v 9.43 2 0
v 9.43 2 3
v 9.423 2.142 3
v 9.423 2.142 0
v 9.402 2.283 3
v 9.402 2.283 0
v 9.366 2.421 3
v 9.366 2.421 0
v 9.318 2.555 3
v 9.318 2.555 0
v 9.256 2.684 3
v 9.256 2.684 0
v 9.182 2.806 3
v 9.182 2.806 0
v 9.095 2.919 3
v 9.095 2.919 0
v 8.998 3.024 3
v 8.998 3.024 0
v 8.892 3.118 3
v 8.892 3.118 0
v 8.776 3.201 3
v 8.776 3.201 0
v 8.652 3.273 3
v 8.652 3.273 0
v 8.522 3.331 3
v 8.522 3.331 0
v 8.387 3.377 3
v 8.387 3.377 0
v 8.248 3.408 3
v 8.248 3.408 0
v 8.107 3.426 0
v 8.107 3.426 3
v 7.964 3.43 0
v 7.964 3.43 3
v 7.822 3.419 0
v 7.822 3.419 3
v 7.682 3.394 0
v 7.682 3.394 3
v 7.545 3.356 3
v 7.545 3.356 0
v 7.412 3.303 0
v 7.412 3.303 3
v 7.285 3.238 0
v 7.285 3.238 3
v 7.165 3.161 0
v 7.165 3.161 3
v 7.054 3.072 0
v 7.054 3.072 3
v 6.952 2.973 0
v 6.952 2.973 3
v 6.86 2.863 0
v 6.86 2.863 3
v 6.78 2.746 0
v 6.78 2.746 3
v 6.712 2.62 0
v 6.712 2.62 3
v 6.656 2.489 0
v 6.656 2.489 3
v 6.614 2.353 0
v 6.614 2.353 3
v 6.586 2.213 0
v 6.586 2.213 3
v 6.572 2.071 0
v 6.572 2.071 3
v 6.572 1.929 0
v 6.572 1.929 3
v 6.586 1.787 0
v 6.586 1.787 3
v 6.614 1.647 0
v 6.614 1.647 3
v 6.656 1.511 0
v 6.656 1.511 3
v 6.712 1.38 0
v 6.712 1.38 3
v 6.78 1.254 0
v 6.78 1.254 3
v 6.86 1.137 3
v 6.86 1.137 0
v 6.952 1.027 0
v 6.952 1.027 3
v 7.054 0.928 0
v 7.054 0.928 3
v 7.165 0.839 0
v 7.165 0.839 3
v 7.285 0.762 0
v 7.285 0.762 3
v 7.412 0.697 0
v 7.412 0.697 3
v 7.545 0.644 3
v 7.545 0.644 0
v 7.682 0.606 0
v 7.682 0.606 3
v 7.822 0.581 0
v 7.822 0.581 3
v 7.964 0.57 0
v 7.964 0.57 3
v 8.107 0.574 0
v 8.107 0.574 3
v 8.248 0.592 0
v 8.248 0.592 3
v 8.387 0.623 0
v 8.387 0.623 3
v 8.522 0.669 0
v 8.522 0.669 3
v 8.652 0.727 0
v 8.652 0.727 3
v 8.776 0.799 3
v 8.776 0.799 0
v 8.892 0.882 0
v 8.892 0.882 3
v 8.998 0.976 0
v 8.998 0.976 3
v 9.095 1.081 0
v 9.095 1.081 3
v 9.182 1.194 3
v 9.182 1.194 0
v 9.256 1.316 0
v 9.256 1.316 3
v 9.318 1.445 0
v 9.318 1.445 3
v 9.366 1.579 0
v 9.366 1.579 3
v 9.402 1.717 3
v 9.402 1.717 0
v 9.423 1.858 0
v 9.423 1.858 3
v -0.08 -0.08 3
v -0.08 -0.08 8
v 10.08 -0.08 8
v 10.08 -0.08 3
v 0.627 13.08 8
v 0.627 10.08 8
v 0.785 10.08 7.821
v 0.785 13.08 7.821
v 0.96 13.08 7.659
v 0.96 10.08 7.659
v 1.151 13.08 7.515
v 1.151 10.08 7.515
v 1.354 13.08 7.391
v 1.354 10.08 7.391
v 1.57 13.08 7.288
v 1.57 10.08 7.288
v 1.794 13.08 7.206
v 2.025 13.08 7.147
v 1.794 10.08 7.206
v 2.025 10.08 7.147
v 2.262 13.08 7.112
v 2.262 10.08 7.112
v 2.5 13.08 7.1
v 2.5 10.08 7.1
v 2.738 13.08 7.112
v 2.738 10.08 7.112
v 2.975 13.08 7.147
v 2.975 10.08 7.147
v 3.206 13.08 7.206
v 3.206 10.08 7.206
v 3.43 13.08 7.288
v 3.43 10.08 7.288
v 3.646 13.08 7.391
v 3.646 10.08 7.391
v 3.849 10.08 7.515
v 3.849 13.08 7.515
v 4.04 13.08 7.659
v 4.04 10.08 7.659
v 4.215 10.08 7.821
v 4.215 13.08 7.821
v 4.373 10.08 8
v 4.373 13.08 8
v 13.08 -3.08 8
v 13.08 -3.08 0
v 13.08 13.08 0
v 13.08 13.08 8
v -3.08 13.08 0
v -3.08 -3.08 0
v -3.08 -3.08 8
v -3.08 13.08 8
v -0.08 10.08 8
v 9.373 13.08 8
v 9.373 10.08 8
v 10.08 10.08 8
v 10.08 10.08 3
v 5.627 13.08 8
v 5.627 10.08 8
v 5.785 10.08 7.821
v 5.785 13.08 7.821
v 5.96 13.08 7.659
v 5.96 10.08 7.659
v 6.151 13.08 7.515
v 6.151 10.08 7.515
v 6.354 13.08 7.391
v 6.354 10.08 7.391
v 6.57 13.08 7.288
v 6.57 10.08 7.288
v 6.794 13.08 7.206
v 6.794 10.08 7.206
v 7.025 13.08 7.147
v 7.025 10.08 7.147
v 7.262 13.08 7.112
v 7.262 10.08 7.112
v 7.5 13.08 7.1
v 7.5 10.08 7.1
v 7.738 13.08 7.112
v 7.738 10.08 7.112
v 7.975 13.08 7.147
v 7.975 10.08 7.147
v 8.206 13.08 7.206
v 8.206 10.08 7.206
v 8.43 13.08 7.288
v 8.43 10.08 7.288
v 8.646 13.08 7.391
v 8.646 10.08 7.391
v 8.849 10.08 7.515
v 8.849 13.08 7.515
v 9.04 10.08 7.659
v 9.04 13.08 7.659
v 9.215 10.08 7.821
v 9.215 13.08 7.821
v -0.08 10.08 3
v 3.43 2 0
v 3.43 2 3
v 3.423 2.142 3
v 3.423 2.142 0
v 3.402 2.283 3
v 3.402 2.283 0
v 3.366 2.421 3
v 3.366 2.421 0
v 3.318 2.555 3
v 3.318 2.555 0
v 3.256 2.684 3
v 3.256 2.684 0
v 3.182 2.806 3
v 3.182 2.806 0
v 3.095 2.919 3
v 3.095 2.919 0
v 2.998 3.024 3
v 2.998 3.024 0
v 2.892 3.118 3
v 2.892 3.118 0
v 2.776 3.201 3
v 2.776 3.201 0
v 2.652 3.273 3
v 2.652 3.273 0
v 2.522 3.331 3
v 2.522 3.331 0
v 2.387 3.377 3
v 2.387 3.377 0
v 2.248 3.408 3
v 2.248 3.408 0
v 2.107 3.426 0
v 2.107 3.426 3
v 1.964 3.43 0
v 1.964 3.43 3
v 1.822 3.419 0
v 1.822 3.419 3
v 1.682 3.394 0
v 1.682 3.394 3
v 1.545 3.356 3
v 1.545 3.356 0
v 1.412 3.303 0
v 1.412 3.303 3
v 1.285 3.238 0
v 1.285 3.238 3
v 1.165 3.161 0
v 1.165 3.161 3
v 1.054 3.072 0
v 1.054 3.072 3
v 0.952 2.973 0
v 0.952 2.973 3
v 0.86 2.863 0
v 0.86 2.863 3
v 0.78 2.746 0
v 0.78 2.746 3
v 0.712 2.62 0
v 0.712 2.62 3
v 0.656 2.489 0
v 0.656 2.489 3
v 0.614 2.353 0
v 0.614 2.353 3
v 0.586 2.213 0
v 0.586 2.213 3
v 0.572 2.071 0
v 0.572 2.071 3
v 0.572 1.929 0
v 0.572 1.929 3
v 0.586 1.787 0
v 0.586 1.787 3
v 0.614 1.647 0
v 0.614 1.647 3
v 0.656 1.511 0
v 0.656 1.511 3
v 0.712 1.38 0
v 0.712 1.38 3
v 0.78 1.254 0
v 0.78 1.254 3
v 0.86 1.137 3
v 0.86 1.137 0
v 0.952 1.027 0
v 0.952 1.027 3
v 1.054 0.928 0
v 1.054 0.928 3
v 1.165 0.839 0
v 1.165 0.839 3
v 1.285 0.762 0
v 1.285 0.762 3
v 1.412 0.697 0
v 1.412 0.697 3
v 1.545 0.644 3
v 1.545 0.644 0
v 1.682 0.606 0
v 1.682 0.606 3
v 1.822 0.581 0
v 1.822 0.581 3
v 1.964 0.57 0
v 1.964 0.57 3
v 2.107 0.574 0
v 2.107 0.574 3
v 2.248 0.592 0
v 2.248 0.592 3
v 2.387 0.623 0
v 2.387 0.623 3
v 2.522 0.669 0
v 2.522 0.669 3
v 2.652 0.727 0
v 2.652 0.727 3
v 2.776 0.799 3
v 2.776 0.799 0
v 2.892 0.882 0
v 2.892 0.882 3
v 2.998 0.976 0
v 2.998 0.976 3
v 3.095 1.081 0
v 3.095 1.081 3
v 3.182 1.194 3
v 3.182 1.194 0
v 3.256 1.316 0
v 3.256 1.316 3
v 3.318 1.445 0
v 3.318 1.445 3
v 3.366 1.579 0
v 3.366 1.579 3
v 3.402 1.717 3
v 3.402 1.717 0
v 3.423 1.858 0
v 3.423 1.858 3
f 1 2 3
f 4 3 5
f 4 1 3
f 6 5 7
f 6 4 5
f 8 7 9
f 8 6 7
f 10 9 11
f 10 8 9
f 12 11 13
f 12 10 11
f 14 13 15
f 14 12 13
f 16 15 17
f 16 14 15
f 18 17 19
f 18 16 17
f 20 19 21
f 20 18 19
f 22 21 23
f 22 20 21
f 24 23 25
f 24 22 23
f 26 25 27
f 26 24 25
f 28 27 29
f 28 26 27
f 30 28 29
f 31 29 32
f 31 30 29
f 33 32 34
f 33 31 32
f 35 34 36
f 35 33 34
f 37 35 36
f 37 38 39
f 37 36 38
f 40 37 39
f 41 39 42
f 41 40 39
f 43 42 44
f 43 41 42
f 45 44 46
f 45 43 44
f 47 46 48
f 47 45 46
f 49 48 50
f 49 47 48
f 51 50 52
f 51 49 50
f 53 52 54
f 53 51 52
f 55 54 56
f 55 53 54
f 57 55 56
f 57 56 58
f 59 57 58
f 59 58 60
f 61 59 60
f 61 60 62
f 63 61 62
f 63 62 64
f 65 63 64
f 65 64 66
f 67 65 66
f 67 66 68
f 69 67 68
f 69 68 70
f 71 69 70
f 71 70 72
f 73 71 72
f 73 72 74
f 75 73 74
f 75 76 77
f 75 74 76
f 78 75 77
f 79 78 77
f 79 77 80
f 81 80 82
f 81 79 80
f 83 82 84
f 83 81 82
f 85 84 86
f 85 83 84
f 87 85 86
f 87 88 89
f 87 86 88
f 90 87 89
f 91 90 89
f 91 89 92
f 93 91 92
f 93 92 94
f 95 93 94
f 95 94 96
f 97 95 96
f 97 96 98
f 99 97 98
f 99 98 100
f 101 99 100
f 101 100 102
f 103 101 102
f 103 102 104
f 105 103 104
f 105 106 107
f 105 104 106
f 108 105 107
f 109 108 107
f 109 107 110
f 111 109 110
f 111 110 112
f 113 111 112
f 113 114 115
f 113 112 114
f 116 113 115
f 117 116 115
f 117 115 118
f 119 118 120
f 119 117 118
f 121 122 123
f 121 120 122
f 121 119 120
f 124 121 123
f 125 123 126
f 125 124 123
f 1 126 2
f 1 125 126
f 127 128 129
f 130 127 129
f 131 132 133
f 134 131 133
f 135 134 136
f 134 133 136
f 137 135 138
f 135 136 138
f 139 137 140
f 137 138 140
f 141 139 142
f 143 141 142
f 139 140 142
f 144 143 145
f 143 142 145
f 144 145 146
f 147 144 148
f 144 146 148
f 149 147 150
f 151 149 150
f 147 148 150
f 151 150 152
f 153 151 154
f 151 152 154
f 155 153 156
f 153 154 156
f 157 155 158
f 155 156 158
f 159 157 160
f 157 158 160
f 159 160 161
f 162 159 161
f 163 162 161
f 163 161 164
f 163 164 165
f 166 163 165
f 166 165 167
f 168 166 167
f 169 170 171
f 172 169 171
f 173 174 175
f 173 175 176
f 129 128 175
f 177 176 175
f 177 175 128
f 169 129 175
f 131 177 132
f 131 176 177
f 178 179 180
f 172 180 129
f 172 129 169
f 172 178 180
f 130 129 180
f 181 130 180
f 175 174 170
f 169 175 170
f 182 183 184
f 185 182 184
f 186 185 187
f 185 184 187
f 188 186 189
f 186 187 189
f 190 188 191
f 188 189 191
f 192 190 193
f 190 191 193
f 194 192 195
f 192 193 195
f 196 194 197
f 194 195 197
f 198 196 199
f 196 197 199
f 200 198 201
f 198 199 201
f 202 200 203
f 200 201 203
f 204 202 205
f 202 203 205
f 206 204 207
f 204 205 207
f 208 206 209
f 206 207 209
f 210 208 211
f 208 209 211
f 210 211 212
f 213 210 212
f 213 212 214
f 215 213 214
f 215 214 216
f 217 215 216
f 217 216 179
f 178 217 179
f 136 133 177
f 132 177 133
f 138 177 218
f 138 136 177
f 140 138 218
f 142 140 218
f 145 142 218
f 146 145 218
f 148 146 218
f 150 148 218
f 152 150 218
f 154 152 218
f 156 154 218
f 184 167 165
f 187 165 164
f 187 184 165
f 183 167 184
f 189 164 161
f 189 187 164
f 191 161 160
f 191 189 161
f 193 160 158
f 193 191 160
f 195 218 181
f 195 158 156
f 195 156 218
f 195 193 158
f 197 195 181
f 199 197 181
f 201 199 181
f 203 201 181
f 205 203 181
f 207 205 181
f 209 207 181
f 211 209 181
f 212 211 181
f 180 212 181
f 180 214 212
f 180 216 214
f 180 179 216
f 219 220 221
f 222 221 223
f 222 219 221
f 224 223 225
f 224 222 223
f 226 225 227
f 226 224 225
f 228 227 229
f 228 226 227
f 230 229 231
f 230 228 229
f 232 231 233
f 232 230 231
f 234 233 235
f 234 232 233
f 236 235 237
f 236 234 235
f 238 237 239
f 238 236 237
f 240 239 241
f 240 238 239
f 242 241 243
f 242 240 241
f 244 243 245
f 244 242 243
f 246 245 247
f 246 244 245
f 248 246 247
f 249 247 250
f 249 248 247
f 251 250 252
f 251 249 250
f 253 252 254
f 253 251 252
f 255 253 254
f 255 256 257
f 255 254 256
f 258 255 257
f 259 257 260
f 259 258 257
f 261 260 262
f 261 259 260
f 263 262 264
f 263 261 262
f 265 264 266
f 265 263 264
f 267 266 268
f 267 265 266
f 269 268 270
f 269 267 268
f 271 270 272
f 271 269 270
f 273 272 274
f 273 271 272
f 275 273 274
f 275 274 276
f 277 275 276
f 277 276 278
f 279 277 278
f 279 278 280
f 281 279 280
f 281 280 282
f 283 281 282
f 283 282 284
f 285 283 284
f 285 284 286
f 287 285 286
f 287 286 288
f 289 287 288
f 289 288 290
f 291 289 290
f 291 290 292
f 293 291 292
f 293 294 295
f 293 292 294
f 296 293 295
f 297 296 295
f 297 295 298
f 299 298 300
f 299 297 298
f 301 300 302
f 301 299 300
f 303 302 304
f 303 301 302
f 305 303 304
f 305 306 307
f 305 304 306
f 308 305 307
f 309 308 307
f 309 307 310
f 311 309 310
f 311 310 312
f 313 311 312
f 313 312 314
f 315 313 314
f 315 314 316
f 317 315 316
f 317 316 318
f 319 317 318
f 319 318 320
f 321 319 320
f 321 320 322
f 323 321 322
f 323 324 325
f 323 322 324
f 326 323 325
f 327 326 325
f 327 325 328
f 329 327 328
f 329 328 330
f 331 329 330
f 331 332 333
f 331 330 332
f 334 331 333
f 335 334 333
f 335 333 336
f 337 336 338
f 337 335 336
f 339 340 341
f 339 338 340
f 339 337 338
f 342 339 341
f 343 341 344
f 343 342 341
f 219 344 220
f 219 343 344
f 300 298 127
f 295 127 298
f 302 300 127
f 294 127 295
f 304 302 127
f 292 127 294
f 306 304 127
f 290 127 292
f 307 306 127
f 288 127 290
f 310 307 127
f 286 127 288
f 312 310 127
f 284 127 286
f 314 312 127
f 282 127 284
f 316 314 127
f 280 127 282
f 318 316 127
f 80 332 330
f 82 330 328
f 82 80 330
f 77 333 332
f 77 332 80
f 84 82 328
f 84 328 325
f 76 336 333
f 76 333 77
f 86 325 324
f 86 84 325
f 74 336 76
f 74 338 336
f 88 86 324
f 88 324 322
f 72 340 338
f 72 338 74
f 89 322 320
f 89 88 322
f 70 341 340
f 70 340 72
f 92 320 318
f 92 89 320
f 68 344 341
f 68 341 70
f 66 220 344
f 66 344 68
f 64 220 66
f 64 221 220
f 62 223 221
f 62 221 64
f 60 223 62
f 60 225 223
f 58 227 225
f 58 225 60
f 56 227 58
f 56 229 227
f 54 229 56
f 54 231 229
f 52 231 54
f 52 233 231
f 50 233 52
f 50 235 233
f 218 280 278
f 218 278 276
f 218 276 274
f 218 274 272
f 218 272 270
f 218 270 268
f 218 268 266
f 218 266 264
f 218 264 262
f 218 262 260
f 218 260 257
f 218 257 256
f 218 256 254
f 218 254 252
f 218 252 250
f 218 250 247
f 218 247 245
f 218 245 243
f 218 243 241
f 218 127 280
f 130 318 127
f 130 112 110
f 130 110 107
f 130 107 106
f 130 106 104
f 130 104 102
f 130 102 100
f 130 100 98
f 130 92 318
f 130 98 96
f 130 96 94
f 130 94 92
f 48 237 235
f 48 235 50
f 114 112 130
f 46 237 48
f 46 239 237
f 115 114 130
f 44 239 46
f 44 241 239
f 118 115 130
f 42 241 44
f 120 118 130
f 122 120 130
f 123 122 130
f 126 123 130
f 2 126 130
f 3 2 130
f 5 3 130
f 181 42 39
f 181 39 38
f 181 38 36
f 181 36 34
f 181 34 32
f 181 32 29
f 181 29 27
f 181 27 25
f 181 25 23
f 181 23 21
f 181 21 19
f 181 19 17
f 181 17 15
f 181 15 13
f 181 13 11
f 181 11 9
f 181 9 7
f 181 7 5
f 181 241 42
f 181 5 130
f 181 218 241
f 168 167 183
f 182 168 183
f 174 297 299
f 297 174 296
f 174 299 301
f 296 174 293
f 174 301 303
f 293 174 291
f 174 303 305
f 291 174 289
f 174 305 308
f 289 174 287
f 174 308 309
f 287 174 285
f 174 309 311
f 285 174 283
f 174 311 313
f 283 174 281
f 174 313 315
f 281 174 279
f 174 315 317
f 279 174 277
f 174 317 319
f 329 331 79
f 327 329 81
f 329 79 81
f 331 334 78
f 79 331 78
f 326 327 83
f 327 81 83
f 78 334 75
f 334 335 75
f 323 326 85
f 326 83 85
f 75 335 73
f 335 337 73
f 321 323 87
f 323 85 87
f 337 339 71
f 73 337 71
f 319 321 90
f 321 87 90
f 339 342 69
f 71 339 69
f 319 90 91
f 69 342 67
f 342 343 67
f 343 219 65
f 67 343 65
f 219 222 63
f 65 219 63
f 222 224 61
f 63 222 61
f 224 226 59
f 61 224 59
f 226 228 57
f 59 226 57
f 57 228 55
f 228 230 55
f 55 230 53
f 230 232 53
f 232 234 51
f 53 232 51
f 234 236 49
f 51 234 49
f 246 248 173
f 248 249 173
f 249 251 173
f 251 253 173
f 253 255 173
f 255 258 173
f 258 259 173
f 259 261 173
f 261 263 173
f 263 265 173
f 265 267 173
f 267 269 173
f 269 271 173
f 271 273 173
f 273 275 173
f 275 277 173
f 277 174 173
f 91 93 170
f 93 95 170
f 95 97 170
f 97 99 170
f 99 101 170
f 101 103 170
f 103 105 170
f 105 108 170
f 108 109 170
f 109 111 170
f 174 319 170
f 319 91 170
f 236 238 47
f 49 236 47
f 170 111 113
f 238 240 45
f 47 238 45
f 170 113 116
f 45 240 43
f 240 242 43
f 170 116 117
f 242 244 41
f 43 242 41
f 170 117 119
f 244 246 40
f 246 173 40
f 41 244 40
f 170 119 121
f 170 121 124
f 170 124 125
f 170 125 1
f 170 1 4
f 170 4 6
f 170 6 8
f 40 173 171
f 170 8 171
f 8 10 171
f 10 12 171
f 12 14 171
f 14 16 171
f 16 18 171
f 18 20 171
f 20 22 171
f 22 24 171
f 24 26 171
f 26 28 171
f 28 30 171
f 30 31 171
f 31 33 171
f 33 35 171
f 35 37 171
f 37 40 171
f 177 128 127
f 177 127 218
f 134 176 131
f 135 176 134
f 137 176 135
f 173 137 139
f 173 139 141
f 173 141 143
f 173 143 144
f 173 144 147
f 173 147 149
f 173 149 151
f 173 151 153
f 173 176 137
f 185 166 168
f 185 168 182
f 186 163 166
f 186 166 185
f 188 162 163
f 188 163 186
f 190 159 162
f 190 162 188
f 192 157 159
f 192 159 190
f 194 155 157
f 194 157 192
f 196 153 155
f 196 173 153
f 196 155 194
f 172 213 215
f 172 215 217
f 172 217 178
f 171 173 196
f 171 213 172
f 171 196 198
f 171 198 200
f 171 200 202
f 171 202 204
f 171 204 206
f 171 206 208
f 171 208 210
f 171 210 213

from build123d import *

# Parameters (mm, degrees)
SKETCH001_W     = 16.16
SKETCH001_H     = 16.16
SKETCH001_R     = 1.43
PAD_DEPTH       = 8
SKETCH002_W     = 10.16
SKETCH002_H     = 10.16
POCKET_DEPTH    = 5
SKETCH003_R     = 2.4
POCKET001_DEPTH = 3.081


with BuildPart() as part:
    # Sketch001 → Pad (new body)
    with BuildSketch(Plane.XY):
        with Locations((5, 5)):
            Rectangle(SKETCH001_W, SKETCH001_H)
        with Locations((2, 2)):
            Circle(SKETCH001_R, mode=Mode.SUBTRACT)
        with Locations((8, 2)):
            Circle(SKETCH001_R, mode=Mode.SUBTRACT)
    extrude(amount=PAD_DEPTH)

    # Sketch002 → Pocket (cut)
    with BuildSketch(Plane.XY.offset(8)):
        with Locations((5, 5)):
            Rectangle(SKETCH002_W, SKETCH002_H)
    extrude(amount=-POCKET_DEPTH, mode=Mode.SUBTRACT)

    # Sketch003 → Pocket001 (cut, through all)
    with BuildSketch(Plane.XZ.offset(-10)):
        with Locations((2.5, 9.5)):
            Circle(SKETCH003_R)
        with Locations((7.5, 9.5)):
            Circle(SKETCH003_R)
    extrude(amount=-POCKET001_DEPTH, mode=Mode.SUBTRACT)


solid = part.part
